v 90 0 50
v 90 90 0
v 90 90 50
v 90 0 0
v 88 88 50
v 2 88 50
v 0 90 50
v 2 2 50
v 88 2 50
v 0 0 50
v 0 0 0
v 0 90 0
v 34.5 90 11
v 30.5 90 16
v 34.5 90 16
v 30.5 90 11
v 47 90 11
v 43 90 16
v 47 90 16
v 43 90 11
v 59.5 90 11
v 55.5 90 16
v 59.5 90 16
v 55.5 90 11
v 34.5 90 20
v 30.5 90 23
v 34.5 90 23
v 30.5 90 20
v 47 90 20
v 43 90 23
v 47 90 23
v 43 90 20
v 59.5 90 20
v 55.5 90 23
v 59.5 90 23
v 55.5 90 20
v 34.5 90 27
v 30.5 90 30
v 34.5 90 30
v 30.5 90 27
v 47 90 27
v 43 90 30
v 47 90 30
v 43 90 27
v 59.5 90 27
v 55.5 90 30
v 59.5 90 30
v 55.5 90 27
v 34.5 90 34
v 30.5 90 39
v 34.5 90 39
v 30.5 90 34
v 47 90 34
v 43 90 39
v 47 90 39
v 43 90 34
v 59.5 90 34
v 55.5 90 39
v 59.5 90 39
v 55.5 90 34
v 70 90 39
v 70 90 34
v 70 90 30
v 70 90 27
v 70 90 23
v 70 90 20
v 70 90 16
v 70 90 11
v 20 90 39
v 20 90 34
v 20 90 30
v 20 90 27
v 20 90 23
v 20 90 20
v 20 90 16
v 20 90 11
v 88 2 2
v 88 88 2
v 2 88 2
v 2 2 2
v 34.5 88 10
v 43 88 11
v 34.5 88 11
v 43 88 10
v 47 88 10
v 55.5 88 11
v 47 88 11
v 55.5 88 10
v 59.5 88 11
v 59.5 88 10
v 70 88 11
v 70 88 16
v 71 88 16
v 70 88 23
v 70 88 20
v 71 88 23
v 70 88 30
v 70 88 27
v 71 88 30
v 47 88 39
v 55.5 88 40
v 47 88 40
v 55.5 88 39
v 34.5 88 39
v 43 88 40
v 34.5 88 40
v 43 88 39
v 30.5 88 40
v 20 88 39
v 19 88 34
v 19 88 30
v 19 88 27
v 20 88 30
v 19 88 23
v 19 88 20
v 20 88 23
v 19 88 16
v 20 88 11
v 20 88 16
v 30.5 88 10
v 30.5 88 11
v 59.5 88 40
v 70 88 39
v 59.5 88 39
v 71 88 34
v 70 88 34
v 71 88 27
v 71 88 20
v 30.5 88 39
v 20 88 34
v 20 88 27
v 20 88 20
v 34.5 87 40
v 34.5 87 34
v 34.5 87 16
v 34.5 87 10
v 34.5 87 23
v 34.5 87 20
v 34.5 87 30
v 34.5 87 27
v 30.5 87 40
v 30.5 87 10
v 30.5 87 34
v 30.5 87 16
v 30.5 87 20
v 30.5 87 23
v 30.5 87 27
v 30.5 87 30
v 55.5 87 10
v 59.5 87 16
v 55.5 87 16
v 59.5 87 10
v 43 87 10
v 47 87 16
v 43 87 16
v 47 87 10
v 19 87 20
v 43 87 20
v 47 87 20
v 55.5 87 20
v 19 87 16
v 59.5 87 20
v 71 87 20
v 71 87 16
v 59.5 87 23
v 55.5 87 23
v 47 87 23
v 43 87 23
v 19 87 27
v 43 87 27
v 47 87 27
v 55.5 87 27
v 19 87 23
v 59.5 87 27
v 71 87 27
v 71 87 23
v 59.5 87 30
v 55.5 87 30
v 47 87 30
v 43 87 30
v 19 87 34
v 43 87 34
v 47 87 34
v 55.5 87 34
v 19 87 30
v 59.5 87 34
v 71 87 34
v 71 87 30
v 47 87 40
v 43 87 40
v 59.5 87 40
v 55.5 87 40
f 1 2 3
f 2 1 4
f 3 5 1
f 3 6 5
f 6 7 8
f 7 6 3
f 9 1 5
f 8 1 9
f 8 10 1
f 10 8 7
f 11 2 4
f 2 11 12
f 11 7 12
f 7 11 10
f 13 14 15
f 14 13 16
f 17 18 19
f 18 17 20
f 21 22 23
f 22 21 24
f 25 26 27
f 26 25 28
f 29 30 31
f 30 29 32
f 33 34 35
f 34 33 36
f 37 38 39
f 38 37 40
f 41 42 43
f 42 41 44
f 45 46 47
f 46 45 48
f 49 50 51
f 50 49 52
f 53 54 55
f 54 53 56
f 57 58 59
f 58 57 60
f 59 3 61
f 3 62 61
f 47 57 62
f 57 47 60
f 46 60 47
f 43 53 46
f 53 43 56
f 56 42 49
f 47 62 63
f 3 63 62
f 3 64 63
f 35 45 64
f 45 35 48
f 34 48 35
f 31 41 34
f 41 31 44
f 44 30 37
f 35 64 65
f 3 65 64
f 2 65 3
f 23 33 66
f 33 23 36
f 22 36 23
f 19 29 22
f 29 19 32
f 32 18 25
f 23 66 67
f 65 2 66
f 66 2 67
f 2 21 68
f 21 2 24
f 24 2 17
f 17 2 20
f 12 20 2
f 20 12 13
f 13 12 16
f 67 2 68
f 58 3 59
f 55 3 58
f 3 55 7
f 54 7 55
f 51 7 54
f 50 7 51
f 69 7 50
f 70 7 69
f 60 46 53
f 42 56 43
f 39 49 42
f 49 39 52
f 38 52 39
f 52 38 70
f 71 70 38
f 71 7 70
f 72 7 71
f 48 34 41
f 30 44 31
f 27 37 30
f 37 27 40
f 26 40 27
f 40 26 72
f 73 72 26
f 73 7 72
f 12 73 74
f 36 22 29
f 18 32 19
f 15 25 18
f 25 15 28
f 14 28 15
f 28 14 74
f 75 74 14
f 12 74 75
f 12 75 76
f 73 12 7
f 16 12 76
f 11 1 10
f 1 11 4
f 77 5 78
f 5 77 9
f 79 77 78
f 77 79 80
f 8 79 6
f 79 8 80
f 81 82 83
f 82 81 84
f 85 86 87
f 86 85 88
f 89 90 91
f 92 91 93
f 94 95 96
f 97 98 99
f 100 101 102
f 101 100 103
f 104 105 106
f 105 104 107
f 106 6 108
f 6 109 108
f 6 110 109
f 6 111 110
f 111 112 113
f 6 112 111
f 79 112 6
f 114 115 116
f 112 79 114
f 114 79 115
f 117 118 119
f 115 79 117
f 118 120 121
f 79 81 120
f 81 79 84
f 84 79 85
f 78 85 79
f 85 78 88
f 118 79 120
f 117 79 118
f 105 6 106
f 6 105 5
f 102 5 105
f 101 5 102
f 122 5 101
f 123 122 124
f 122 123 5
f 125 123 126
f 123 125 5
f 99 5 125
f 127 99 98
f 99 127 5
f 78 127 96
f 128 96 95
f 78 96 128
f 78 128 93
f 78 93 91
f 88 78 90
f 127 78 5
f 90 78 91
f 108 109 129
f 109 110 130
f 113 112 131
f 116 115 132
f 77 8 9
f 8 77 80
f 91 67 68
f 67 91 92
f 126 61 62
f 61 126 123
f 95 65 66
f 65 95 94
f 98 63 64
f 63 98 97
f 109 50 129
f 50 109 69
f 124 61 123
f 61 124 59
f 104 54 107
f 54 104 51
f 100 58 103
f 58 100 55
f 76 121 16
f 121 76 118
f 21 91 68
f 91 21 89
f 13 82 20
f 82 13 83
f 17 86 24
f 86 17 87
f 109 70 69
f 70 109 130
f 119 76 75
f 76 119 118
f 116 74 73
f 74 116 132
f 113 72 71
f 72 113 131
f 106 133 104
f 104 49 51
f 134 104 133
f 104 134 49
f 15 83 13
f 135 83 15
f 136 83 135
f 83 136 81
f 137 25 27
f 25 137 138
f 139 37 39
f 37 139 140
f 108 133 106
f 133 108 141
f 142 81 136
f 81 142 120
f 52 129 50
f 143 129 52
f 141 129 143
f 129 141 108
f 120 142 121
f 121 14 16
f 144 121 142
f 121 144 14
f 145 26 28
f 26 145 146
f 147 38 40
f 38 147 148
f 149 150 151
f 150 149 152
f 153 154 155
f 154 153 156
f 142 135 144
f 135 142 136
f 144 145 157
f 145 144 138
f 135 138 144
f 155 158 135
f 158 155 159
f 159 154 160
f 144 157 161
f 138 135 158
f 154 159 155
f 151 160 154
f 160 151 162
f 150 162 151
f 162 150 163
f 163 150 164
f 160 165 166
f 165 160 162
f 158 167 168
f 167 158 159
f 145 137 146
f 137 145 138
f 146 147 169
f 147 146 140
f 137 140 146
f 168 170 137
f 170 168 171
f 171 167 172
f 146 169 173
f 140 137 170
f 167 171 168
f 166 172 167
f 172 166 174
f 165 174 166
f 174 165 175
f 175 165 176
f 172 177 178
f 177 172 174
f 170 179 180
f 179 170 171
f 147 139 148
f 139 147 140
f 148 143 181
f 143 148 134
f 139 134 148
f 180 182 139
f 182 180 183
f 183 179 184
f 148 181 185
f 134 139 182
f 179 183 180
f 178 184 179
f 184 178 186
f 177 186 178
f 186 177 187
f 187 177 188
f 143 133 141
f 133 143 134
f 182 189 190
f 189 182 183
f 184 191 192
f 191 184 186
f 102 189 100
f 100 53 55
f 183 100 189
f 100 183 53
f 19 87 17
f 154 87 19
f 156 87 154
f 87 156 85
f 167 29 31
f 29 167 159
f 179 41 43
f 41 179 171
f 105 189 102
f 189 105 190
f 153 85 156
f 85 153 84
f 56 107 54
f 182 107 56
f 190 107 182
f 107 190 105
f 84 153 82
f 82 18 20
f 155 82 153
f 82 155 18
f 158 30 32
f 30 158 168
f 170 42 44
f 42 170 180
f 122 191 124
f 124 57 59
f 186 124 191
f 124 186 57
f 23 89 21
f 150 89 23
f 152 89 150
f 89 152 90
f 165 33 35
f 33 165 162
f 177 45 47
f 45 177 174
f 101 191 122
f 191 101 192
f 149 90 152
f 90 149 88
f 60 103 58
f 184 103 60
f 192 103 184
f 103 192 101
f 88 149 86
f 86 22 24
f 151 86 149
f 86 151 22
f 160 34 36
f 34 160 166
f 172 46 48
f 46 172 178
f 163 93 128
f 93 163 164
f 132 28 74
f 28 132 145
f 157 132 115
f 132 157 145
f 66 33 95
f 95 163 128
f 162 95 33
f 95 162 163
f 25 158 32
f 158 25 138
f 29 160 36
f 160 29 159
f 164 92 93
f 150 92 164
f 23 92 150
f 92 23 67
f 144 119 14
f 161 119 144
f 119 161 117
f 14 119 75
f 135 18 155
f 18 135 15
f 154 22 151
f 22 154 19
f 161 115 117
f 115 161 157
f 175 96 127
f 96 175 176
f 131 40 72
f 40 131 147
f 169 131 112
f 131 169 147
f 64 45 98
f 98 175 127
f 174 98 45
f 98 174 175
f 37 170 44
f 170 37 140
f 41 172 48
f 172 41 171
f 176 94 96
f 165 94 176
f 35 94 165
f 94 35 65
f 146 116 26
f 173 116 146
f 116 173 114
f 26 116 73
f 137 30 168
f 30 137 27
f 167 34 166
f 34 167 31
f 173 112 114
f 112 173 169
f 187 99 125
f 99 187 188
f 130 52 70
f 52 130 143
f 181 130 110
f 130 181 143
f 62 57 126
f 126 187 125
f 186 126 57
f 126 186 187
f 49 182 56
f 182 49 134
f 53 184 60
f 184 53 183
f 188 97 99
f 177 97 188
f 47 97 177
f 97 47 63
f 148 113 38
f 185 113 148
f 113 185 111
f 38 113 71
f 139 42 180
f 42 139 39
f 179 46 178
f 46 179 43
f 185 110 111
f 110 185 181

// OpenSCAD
$fn = 32;

// ----------------------------------------------------------------------
// Vent box: crossgrid enclosure
// ----------------------------------------------------------------------

// --- parameters (mm) ---
box_l = 90;               // box length, X
box_w = 90;               // box width, Y
box_h = 50;               // box height, Z
wall_t = 2;               // shell wall thickness
win_l = 50;               // vent window width, X
win_h = 28;               // vent window height, Z
bar_w = 4;                // grid bar width
n_v = 3;                  // vertical bar count
n_h = 3;                  // horizontal bar count

win_z0 = (box_h - win_h) / 2;  // window lower edge Z
v_step = win_l / (n_v + 1);  // vertical bar step
h_step = win_h / (n_h + 1);  // horizontal bar step

difference() {
  union() {
    difference() {
      cube([box_l, box_w, box_h]);
  translate([wall_t, wall_t, wall_t])
    cube([box_l - 2 * wall_t, box_w - 2 * wall_t, box_h]);
  translate([(box_l - win_l) / 2, box_w - wall_t - 1, win_z0])
    cube([win_l, wall_t + 2, win_h]);
    }
    for (i = [1 : n_v])
      translate([(box_l - win_l) / 2 + i * v_step - bar_w / 2,
                 box_w - wall_t - 1, win_z0 - 1])
        cube([bar_w, wall_t + 1, win_h + 2]);
    for (i = [1 : n_h])
      translate([(box_l - win_l) / 2 - 1, box_w - wall_t - 1,
                 win_z0 + i * h_step - bar_w / 2])
        cube([win_l + 2, wall_t + 1, bar_w]);
  }
}
